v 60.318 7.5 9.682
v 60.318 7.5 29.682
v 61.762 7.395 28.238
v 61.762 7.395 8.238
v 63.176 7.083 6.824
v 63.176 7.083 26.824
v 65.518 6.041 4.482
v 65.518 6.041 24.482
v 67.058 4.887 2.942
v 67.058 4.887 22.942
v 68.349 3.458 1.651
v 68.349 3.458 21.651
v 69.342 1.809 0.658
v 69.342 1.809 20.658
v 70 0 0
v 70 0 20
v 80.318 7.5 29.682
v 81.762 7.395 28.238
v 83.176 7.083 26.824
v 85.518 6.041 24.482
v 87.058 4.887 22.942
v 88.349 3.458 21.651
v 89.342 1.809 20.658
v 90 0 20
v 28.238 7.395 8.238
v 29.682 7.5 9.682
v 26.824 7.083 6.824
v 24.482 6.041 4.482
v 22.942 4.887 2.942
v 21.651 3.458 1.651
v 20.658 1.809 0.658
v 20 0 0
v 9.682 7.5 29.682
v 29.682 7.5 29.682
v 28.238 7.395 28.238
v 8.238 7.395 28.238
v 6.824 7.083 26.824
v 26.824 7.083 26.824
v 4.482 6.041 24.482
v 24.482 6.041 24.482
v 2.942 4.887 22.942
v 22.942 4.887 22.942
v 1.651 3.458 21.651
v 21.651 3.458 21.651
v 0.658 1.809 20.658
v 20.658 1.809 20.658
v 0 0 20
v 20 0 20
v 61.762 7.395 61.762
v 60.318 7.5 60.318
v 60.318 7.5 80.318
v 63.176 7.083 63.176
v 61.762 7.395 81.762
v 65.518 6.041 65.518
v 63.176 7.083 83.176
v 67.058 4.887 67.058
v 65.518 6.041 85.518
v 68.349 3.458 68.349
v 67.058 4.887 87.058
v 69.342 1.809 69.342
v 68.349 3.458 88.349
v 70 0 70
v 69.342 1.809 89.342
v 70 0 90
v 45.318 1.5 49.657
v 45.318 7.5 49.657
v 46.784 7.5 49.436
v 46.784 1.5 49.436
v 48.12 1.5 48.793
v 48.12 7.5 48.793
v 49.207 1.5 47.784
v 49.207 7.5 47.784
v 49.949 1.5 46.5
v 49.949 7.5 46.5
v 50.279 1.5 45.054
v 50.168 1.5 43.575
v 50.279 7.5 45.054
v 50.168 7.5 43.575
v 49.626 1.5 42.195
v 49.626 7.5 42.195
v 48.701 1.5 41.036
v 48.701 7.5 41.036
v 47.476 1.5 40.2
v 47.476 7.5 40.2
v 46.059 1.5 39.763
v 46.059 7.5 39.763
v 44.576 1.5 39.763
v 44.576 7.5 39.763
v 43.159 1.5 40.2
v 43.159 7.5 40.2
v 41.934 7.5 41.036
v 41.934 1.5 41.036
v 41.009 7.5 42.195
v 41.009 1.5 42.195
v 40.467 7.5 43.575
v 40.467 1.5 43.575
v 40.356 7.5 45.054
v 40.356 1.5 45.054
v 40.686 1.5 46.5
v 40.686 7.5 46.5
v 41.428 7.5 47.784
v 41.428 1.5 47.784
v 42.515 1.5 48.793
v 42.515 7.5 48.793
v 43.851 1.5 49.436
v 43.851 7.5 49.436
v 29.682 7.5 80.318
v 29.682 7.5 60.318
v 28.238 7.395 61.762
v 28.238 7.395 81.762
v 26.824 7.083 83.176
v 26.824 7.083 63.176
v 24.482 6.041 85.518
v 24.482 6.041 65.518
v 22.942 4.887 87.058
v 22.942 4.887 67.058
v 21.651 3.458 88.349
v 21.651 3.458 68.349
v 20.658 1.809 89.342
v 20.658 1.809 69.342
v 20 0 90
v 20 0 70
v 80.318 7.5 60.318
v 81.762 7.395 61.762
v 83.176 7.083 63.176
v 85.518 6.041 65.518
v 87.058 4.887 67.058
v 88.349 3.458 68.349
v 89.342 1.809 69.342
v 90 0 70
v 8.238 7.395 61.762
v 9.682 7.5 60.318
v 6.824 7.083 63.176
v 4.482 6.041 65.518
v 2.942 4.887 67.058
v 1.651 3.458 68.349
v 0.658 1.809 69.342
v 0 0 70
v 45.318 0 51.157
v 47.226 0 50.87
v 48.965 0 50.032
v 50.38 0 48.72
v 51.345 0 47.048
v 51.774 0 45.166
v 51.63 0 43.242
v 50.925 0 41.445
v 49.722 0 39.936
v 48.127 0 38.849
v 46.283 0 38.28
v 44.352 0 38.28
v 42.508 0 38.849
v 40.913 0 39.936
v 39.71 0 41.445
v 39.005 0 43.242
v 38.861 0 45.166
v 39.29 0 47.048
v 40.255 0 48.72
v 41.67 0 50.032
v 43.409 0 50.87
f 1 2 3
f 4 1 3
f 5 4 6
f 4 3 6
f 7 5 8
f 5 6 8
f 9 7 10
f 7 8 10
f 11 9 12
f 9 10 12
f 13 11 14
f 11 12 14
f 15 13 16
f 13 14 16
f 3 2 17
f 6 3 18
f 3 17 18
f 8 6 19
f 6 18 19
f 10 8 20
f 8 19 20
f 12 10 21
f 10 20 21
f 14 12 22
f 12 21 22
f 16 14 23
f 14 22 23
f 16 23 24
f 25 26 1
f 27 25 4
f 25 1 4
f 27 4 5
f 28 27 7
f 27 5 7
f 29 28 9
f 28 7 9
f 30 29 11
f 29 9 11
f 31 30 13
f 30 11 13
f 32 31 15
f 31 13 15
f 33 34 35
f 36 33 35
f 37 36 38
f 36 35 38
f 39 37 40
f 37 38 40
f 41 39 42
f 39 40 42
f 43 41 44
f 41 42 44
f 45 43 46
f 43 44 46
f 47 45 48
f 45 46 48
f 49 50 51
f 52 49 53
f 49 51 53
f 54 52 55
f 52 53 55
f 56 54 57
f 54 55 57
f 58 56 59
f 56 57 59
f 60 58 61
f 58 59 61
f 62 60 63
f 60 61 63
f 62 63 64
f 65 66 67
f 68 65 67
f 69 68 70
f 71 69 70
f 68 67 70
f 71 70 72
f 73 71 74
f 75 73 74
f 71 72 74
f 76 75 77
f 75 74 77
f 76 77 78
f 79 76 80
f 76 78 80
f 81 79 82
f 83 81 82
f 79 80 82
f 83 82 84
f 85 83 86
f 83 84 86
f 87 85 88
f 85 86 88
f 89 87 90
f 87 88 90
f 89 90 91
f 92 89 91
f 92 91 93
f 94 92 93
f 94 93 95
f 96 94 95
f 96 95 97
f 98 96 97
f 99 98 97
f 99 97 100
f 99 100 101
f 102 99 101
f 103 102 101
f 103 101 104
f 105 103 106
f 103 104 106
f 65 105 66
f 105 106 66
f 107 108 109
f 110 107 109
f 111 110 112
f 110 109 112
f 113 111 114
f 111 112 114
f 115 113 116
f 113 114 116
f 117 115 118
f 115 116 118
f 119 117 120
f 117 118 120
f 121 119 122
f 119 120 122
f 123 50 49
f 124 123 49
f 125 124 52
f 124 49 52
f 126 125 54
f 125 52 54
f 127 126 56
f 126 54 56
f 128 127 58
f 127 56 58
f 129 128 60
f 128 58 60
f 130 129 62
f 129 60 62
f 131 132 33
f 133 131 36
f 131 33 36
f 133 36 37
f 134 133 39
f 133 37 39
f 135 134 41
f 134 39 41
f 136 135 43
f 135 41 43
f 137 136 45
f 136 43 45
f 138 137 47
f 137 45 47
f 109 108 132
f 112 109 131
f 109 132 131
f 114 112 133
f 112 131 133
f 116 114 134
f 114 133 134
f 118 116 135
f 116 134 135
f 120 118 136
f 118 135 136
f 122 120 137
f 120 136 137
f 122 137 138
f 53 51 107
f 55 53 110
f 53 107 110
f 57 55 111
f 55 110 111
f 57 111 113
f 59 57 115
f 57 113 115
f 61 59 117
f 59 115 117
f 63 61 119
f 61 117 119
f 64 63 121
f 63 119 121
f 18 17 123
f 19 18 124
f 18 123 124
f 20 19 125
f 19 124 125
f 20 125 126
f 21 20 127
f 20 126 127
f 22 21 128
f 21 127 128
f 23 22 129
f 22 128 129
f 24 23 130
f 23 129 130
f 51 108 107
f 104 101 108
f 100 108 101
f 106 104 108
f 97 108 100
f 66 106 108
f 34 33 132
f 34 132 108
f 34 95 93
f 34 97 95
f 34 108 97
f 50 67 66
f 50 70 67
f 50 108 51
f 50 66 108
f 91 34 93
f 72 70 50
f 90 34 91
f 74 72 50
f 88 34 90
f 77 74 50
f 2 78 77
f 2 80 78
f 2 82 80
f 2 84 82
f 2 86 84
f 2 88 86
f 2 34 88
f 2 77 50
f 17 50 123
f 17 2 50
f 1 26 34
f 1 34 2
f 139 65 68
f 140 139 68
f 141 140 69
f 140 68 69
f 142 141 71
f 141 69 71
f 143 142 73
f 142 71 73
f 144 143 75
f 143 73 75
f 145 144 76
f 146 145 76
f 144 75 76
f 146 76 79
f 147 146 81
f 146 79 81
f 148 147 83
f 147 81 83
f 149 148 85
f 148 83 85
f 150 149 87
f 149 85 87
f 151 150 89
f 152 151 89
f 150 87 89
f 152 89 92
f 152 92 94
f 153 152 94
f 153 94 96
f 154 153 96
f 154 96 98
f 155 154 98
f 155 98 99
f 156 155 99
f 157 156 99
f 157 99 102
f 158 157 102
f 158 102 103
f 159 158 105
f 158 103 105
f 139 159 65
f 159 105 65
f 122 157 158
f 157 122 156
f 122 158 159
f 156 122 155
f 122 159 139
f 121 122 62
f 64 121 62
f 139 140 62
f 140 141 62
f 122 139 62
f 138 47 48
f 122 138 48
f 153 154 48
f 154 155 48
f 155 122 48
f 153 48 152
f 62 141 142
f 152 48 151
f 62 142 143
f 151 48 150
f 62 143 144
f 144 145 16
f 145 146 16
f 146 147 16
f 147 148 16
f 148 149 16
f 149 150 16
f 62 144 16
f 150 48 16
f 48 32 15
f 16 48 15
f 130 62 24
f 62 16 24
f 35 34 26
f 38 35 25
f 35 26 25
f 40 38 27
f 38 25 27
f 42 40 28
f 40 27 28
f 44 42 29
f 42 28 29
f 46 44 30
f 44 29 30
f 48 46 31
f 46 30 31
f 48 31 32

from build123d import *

# Parameters (mm, degrees)
BOSS_EXTRUDE1_DEPTH = 7.5
FILLET1_R           = 10
SKETCH2_R           = 4.975
CUT_EXTRUDE1_DEPTH  = 7.5
CHAMFER1_SIZE       = 1.5


with BuildPart() as part:
    # Sketch1 → Boss-Extrude1 (new body)
    with BuildSketch(Plane(origin=(0, 0, 0), x_dir=(1, 0, 0), z_dir=(0, 1, 0))):
        Polygon((70, 0), (20, 0), (20, -20), (0, -20), (0, -70), (20, -70), (20, -90), (70, -90), (70, -70), (90, -70), (90, -20), (70, -20), align=None)
    extrude(amount=BOSS_EXTRUDE1_DEPTH)

    # Fillet1
    # the kernel refuses this fillet: 10 mm, written as the material it takes off along each edge
    with BuildSketch(Plane(origin=(-24.206145914, 7.5, 70), x_dir=(0, -1, 0), z_dir=(1, 0, 0)), Plane(origin=(20, 7.5, 70), x_dir=(0, -1, 0), z_dir=(0, 0, 1)), Plane(origin=(70, 7.5, 114.206145914), x_dir=(0, -1, 0), z_dir=(0, 0, -1)), Plane(origin=(70, 7.5, 70), x_dir=(0, -1, 0), z_dir=(1, 0, 0)), Plane(origin=(114.206145914, 7.5, 20), x_dir=(0, -1, 0), z_dir=(-1, 0, 0)), Plane(origin=(70, 7.5, 20), x_dir=(0, -1, 0), z_dir=(0, 0, -1)), Plane(origin=(20, 7.5, -24.206145914), x_dir=(0, -1, 0), z_dir=(0, 0, 1)), Plane(origin=(20, 7.5, 20), x_dir=(0, -1, 0), z_dir=(-1, 0, 0))) as fillet1_piece_1:
        with BuildLine():
            CenterArc((10, 9.682458366), FILLET1_R, 180, 75.522487814)
            Line((0, 9.682458366), (-0.2, 9.682458366))
            Line((-0.2, 9.682458366), (-0.2, 0))
            Line((-0.2, 0), (0, -0.2))
            ThreePointArc((0, -0.2), (3.75, -0.2), (7.45, -0.193649167))
            Line((7.45, -0.193649167), (7.5, 0))
        make_face()
    extrude(amount=44.206145914, mode=Mode.SUBTRACT)
    with BuildSketch(Plane(origin=(-4.206145914, 7.5, 90), x_dir=(0, -1, 0), z_dir=(1, 0, 0)), Plane(origin=(90, 7.5, 94.206145914), x_dir=(0, -1, 0), z_dir=(0, 0, -1)), Plane(origin=(94.206145914, 7.5, 0), x_dir=(0, -1, 0), z_dir=(-1, 0, 0)), Plane(origin=(0, 7.5, -4.206145914), x_dir=(0, -1, 0), z_dir=(0, 0, 1))) as fillet1_piece_2:
        with BuildLine():
            CenterArc((10, 9.682458366), FILLET1_R, 180, 75.522487814)
            Line((0, 9.682458366), (-0.2, 9.682458366))
            Line((-0.2, 9.682458366), (-0.2, 0))
            Line((-0.2, 0), (0, -0.2))
            ThreePointArc((0, -0.2), (3.75, -0.2), (7.45, -0.193649167))
            Line((7.45, -0.193649167), (7.5, 0))
        make_face()
    extrude(amount=98.412291828, mode=Mode.SUBTRACT)
    with BuildSketch(Plane(origin=(-24.206145914, 7.5, 70), x_dir=(0, -1, 0), z_dir=(1, 0, 0))) as fillet1_piece_3a_section:
        with BuildLine():
            CenterArc((10, 9.682458366), FILLET1_R, 180, 75.522487814)
            Line((0, 9.682458366), (-0.2, 9.682458366))
            Line((-0.2, 9.682458366), (-0.2, 0))
            Line((-0.2, 0), (0, -0.2))
            ThreePointArc((0, -0.2), (3.75, -0.2), (7.45, -0.193649167))
            Line((7.45, -0.193649167), (7.5, 0))
        make_face()
    fillet1_piece_3a = extrude(amount=68.412291828, mode=Mode.PRIVATE)
    fillet1_piece_3a = split(fillet1_piece_3a, bisect_by=Plane(origin=(20, 5.604082443, 67.718558992), z_dir=(1, 0, 0)), keep=Keep.TOP, mode=Mode.PRIVATE)
    with BuildSketch(Plane(origin=(20, 7.5, 45.793854086), x_dir=(0, -1, 0), z_dir=(0, 0, 1))) as fillet1_piece_3b_section:
        with BuildLine():
            CenterArc((10, 9.682458366), FILLET1_R, 180, 75.522487814)
            Line((0, 9.682458366), (-0.2, 9.682458366))
            Line((-0.2, 9.682458366), (-0.2, 0))
            Line((-0.2, 0), (0, -0.2))
            ThreePointArc((0, -0.2), (3.75, -0.2), (7.45, -0.193649167))
            Line((7.45, -0.193649167), (7.5, 0))
        make_face()
    fillet1_piece_3b = extrude(amount=68.412291828, mode=Mode.PRIVATE)
    fillet1_piece_3b = split(fillet1_piece_3b, bisect_by=Plane(origin=(22.281441008, 5.604082443, 70), z_dir=(0, 0, -1)), keep=Keep.TOP, mode=Mode.PRIVATE)
    fillet1_piece_3 = fillet1_piece_3a & fillet1_piece_3b
    add(fillet1_piece_3, mode=Mode.SUBTRACT)
    with BuildSketch(Plane(origin=(70, 7.5, 114.206145914), x_dir=(0, -1, 0), z_dir=(0, 0, -1))) as fillet1_piece_4a_section:
        with BuildLine():
            CenterArc((10, 9.682458366), FILLET1_R, 180, 75.522487814)
            Line((0, 9.682458366), (-0.2, 9.682458366))
            Line((-0.2, 9.682458366), (-0.2, 0))
            Line((-0.2, 0), (0, -0.2))
            ThreePointArc((0, -0.2), (3.75, -0.2), (7.45, -0.193649167))
            Line((7.45, -0.193649167), (7.5, 0))
        make_face()
    fillet1_piece_4a = extrude(amount=68.412291828, mode=Mode.PRIVATE)
    fillet1_piece_4a = split(fillet1_piece_4a, bisect_by=Plane(origin=(67.718558992, 5.604082443, 70), z_dir=(0, 0, -1)), keep=Keep.TOP, mode=Mode.PRIVATE)
    with BuildSketch(Plane(origin=(45.793854086, 7.5, 70), x_dir=(0, -1, 0), z_dir=(1, 0, 0))) as fillet1_piece_4b_section:
        with BuildLine():
            CenterArc((10, 9.682458366), FILLET1_R, 180, 75.522487814)
            Line((0, 9.682458366), (-0.2, 9.682458366))
            Line((-0.2, 9.682458366), (-0.2, 0))
            Line((-0.2, 0), (0, -0.2))
            ThreePointArc((0, -0.2), (3.75, -0.2), (7.45, -0.193649167))
            Line((7.45, -0.193649167), (7.5, 0))
        make_face()
    fillet1_piece_4b = extrude(amount=68.412291828, mode=Mode.PRIVATE)
    fillet1_piece_4b = split(fillet1_piece_4b, bisect_by=Plane(origin=(70, 5.604082443, 67.718558992), z_dir=(-1, 0, 0)), keep=Keep.TOP, mode=Mode.PRIVATE)
    fillet1_piece_4 = fillet1_piece_4a & fillet1_piece_4b
    add(fillet1_piece_4, mode=Mode.SUBTRACT)
    with BuildSketch(Plane(origin=(114.206145914, 7.5, 20), x_dir=(0, -1, 0), z_dir=(-1, 0, 0))) as fillet1_piece_5a_section:
        with BuildLine():
            CenterArc((10, 9.682458366), FILLET1_R, 180, 75.522487814)
            Line((0, 9.682458366), (-0.2, 9.682458366))
            Line((-0.2, 9.682458366), (-0.2, 0))
            Line((-0.2, 0), (0, -0.2))
            ThreePointArc((0, -0.2), (3.75, -0.2), (7.45, -0.193649167))
            Line((7.45, -0.193649167), (7.5, 0))
        make_face()
    fillet1_piece_5a = extrude(amount=68.412291828, mode=Mode.PRIVATE)
    fillet1_piece_5a = split(fillet1_piece_5a, bisect_by=Plane(origin=(70, 5.604082443, 22.281441008), z_dir=(-1, 0, 0)), keep=Keep.TOP, mode=Mode.PRIVATE)
    with BuildSketch(Plane(origin=(70, 7.5, 44.206145914), x_dir=(0, -1, 0), z_dir=(0, 0, -1))) as fillet1_piece_5b_section:
        with BuildLine():
            CenterArc((10, 9.682458366), FILLET1_R, 180, 75.522487814)
            Line((0, 9.682458366), (-0.2, 9.682458366))
            Line((-0.2, 9.682458366), (-0.2, 0))
            Line((-0.2, 0), (0, -0.2))
            ThreePointArc((0, -0.2), (3.75, -0.2), (7.45, -0.193649167))
            Line((7.45, -0.193649167), (7.5, 0))
        make_face()
    fillet1_piece_5b = extrude(amount=68.412291828, mode=Mode.PRIVATE)
    fillet1_piece_5b = split(fillet1_piece_5b, bisect_by=Plane(origin=(67.718558992, 5.604082443, 20), z_dir=(0, 0, 1)), keep=Keep.TOP, mode=Mode.PRIVATE)
    fillet1_piece_5 = fillet1_piece_5a & fillet1_piece_5b
    add(fillet1_piece_5, mode=Mode.SUBTRACT)
    with BuildSketch(Plane(origin=(20, 7.5, -24.206145914), x_dir=(0, -1, 0), z_dir=(0, 0, 1))) as fillet1_piece_6a_section:
        with BuildLine():
            CenterArc((10, 9.682458366), FILLET1_R, 180, 75.522487814)
            Line((0, 9.682458366), (-0.2, 9.682458366))
            Line((-0.2, 9.682458366), (-0.2, 0))
            Line((-0.2, 0), (0, -0.2))
            ThreePointArc((0, -0.2), (3.75, -0.2), (7.45, -0.193649167))
            Line((7.45, -0.193649167), (7.5, 0))
        make_face()
    fillet1_piece_6a = extrude(amount=68.412291828, mode=Mode.PRIVATE)
    fillet1_piece_6a = split(fillet1_piece_6a, bisect_by=Plane(origin=(22.281441008, 5.604082443, 20), z_dir=(0, 0, 1)), keep=Keep.TOP, mode=Mode.PRIVATE)
    with BuildSketch(Plane(origin=(44.206145914, 7.5, 20), x_dir=(0, -1, 0), z_dir=(-1, 0, 0))) as fillet1_piece_6b_section:
        with BuildLine():
            CenterArc((10, 9.682458366), FILLET1_R, 180, 75.522487814)
            Line((0, 9.682458366), (-0.2, 9.682458366))
            Line((-0.2, 9.682458366), (-0.2, 0))
            Line((-0.2, 0), (0, -0.2))
            ThreePointArc((0, -0.2), (3.75, -0.2), (7.45, -0.193649167))
            Line((7.45, -0.193649167), (7.5, 0))
        make_face()
    fillet1_piece_6b = extrude(amount=68.412291828, mode=Mode.PRIVATE)
    fillet1_piece_6b = split(fillet1_piece_6b, bisect_by=Plane(origin=(20, 5.604082443, 22.281441008), z_dir=(1, 0, 0)), keep=Keep.TOP, mode=Mode.PRIVATE)
    fillet1_piece_6 = fillet1_piece_6a & fillet1_piece_6b
    add(fillet1_piece_6, mode=Mode.SUBTRACT)

    # Sketch2 → Cut-Extrude1 (cut)
    with BuildSketch(Plane(origin=(0, 7.5, 0), x_dir=(1, 0, 0), z_dir=(0, 1, 0))):
        with Locations(Location((45.317541634, -44.682458366, 0), (0, 0, 270))):
            Circle(SKETCH2_R)
    extrude(amount=-CUT_EXTRUDE1_DEPTH, mode=Mode.SUBTRACT)

    # Chamfer1
    chamfer1_edges = [part.edges().sort_by_distance(p)[0] for p in [
        (45.317541634, 0, 39.707458366),
    ]]
    chamfer(chamfer1_edges, length=CHAMFER1_SIZE)


solid = part.part
